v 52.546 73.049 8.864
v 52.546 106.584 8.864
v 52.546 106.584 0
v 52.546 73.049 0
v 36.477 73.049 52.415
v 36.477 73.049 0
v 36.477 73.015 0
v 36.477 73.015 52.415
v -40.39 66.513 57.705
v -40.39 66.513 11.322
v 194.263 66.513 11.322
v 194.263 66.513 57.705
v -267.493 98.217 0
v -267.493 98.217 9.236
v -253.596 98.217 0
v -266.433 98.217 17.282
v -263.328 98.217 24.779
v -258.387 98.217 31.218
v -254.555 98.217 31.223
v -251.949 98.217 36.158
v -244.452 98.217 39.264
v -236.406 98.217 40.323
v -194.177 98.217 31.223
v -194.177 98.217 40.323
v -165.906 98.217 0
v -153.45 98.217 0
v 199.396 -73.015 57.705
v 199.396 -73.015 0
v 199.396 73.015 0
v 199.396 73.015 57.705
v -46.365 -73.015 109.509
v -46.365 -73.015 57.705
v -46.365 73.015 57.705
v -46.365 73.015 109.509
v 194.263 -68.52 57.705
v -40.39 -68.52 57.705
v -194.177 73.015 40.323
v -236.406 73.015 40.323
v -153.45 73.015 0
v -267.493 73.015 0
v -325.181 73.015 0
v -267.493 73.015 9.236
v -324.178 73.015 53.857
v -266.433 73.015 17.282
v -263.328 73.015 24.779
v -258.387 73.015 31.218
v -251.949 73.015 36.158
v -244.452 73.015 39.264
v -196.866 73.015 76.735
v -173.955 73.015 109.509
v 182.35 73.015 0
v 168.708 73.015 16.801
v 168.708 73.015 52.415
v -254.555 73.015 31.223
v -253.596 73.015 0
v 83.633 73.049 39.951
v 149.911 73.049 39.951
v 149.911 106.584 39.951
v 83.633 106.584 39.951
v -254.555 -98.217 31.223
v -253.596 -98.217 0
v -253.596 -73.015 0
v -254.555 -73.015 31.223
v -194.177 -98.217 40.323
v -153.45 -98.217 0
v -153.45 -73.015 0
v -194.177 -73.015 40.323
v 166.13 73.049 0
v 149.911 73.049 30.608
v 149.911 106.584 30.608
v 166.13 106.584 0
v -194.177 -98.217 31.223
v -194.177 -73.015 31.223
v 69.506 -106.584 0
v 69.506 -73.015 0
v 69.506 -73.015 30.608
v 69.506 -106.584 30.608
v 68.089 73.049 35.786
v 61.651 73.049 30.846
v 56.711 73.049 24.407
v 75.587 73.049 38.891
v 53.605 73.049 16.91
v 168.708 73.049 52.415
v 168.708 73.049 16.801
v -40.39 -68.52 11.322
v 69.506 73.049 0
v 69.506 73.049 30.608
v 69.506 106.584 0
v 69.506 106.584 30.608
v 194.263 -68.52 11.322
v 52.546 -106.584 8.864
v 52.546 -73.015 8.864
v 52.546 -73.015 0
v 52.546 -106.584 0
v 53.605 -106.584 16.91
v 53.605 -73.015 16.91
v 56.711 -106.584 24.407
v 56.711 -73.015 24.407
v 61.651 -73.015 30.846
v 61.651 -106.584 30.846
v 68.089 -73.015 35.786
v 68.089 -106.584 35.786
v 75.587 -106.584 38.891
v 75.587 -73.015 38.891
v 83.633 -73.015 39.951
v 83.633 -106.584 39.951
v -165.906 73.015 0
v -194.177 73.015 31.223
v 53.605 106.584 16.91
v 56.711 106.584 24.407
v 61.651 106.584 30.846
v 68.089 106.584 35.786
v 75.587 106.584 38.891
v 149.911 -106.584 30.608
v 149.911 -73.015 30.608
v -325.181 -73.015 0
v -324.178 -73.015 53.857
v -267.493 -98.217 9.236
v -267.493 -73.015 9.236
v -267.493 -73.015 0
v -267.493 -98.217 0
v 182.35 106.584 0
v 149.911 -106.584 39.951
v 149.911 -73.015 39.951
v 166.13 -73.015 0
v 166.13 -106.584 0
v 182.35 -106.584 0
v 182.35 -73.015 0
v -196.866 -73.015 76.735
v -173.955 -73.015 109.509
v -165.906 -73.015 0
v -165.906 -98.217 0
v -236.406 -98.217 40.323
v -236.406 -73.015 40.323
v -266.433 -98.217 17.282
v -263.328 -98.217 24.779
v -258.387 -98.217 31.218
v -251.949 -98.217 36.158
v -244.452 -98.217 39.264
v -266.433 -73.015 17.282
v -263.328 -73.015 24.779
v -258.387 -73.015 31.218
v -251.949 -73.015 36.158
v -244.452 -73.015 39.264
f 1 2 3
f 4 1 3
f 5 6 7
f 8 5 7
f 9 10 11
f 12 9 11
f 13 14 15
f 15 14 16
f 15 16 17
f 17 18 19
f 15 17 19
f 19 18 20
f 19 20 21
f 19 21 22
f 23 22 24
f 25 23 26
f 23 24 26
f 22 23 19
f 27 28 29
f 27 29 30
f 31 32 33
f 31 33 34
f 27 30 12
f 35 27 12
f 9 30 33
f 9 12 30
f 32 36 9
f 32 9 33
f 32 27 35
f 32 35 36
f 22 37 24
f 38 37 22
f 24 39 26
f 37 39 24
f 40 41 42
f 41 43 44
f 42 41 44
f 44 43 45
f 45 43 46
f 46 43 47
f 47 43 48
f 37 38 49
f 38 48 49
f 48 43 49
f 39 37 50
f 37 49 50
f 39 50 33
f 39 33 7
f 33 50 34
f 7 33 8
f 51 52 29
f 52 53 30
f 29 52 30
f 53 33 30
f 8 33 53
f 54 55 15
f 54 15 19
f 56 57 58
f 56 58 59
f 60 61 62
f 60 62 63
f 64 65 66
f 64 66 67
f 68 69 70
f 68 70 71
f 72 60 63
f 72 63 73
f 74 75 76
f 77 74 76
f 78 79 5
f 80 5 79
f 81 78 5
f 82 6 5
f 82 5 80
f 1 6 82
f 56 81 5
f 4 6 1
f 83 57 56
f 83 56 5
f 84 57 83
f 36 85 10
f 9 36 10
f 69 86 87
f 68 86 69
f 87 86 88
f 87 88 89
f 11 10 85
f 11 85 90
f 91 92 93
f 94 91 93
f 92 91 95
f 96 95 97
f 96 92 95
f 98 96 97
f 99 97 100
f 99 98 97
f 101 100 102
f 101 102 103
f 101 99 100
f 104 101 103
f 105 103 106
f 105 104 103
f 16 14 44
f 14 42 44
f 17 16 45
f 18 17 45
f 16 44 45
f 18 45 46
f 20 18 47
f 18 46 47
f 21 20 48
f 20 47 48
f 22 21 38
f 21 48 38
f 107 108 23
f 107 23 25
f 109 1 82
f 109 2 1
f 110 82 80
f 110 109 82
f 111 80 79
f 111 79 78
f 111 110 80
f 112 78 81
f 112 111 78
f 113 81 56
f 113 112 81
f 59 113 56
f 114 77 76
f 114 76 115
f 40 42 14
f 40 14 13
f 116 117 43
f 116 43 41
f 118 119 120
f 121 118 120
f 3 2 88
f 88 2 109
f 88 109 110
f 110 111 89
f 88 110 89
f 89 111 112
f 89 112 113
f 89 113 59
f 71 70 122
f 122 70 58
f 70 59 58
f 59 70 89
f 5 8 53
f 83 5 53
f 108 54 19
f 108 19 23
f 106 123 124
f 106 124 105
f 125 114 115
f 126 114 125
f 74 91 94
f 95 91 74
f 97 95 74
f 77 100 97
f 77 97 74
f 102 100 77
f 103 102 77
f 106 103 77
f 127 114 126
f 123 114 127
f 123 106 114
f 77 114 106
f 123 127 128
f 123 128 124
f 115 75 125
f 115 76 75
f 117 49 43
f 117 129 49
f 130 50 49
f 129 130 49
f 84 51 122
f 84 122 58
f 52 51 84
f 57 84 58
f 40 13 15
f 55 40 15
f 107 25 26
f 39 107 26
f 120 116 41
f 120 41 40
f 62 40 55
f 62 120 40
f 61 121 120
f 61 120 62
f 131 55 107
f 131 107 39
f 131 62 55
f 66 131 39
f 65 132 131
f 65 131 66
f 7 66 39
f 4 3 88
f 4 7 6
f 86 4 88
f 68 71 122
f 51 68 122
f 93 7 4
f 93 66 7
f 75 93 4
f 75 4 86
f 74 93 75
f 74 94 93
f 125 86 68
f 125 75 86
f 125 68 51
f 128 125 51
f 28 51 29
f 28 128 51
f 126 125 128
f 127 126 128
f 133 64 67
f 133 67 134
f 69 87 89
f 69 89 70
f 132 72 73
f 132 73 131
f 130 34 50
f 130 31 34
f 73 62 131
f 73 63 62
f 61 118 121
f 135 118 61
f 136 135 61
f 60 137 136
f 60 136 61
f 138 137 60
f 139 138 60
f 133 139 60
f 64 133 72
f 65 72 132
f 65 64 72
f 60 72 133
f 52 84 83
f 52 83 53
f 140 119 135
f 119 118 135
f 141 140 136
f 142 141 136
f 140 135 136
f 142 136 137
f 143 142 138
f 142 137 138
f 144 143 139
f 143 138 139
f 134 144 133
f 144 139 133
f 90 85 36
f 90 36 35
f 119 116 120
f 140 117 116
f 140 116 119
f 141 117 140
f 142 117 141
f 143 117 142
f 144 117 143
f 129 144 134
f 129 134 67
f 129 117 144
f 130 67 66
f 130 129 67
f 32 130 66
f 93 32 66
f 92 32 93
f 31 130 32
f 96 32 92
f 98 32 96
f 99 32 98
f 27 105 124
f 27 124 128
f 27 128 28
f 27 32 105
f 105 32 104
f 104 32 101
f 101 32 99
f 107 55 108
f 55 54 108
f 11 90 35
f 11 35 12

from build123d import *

# Parameters (mm, degrees)
F1_DEPTH  = 73.0149932206
F2_W      = 104.7701835632
F2_H      = 146.0299864411
F2_W_2    = 132.2311162949
F2_H_2    = 146.0643596947
F3_DEPTH  = 52.4154347368
F5_DEPTH  = 98.2172647491
F6_W      = 16.9606506824
F6_H      = 30.608355999
F7_DEPTH  = 106.583558023
F8_W      = 234.6536517143
F8_H      = 135.0331306458
F9_DEPTH  = 105.9223469347
F10_W     = 239.1506135464
F10_H     = 140.1097029448
F11_DEPTH = 11.3217700273
F12_R     = 31.0869450518


with BuildPart() as f1:
    # F0 (on Front) → F1 (new body, symmetric)
    with BuildSketch(Plane.XZ):
        Polygon((-196.8656778336, 76.734662056), (-324.1775035858, 53.8567006588), (-325.180709362, 0), (-285.0417494774, 0), (-285.0417494774, 34.4426184893), (-233.2133054733, 34.4426184893), (-232.1556210518, 0), (76.5154957771, 0), (76.5154957771, 33.5566699505), (141.2207484245, 33.5566699505), (140.163064003, 0), (199.3955373764, 0), (199.3955373764, 57.7045381069), (-46.3645458221, 57.7045381069), (-46.3645458221, 109.5087528229), (-173.955321312, 109.5087528229), align=None)
    extrude(amount=F1_DEPTH, both=True)

    # F2 (on face) → F3 (join)
    with BuildSketch(Plane(origin=(0, 0, 0), x_dir=(1, 0, 0), z_dir=(0, 0, -1))):
        with Locations((-246.2981939316, 0)):
            Rectangle(F2_W, F2_H)
        with Locations((102.5924086571, -0.0171866268)):
            Rectangle(F2_W_2, F2_H_2)
    extrude(amount=-F3_DEPTH)

    # F4 (on Front) → F5 (join, symmetric)
    with BuildSketch(Plane.XZ):
        Polygon((-194.1774785519, 40.3228625655), (-267.4925923347, 40.3228625655), (-267.4925923347, 31.2233567238), (-254.5548379421, 31.2233567238), (-194.1774785519, 31.2233567238), align=None)
        Polygon((-153.4504890442, 0), (-194.1774785519, 40.3228625655), (-194.1774785519, 31.2233567238), (-165.9055352211, 0), align=None)
        Polygon((-254.5548379421, 31.2233567238), (-267.4925923347, 31.2233567238), (-267.4925923347, 0), (-253.5964548588, 0), align=None)
    extrude(amount=F5_DEPTH, both=True)

    # F6 (on Front) → F7 (join, symmetric)
    with BuildSketch(Plane.XZ):
        Polygon((52.5457262993, 39.950683713), (52.5457262993, 30.608355999), (69.5063769817, 30.608355999), (149.9110460281, 30.608355999), (149.9110460281, 39.950683713), align=None)
        with Locations((61.0260516405, 15.3041779995)):
            Rectangle(F6_W, F6_H)
        Polygon((149.9110460281, 39.950683713), (149.9110460281, 30.608355999), (166.1303341389, 0), (182.3496222496, 0), align=None)
    extrude(amount=F7_DEPTH, both=True)

    # F8 (on Top) → F9 (cut)
    with BuildSketch(Plane.XY):
        with Locations((76.9363343716, -1.0031461716)):
            Rectangle(F8_W, F8_H)
    extrude(amount=F9_DEPTH, mode=Mode.SUBTRACT)

    # F10 (on Top) → F11 (join)
    with BuildSketch(Plane.XY):
        with Locations((76.5912085772, -0.3399476409)):
            Rectangle(F10_W, F10_H)
    extrude(amount=F11_DEPTH)

    # F12
    f12_edges = [f1.edges().sort_by_distance(p)[0] for p in [
        (52.545726, 89.816462, 39.950684),
        (-267.492592, 85.616129, 40.322863),
        (-267.492592, -85.616129, 40.322863),
        (52.545726, -89.799276, 39.950684),
    ]]
    fillet(f12_edges, radius=F12_R)


solid = f1.part
